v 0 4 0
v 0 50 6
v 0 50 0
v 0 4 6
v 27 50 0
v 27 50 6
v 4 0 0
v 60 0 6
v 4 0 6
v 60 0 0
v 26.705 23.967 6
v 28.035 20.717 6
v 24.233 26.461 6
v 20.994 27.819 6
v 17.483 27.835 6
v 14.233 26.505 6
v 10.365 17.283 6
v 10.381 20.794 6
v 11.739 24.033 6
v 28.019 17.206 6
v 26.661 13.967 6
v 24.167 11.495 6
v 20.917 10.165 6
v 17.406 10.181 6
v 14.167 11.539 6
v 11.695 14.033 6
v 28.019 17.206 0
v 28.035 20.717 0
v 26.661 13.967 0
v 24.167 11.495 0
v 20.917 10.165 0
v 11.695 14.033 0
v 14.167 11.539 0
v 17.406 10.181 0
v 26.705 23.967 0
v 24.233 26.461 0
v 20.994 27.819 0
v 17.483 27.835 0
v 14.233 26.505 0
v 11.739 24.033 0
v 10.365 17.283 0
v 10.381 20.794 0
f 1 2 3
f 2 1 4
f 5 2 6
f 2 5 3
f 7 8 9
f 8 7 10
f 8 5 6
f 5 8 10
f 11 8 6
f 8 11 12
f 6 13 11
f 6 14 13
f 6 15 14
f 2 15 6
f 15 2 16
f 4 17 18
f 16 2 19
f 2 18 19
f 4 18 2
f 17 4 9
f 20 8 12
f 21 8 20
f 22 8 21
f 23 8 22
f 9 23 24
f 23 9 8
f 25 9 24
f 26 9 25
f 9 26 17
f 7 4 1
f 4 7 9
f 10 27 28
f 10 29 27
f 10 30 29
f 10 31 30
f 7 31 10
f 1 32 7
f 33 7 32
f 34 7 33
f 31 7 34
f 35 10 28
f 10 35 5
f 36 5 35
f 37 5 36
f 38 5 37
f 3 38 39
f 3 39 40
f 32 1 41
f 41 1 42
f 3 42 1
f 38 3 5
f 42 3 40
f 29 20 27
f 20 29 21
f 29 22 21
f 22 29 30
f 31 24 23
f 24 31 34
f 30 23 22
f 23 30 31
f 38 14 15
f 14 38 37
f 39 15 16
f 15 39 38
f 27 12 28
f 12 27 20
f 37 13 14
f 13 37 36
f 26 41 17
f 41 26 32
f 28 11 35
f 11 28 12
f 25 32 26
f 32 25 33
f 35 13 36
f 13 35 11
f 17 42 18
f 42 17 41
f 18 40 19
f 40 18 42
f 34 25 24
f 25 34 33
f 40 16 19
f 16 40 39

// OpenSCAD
$fn = 32;

// ----------------------------------------------------------------------
// Bracket plate: gusset 60 x 50
// ----------------------------------------------------------------------

// --- parameters (mm) ---
hole_r = 4;               // bolt hole radius
plate_t = 6;              // plate thickness, Z (extrusion height)
gus_a = 60;               // base length
gus_b = 50;               // height
top_x = 27;               // top edge X of the angled cut
light_r = 9;              // lightening hole radius

light_d = 2 * light_r;

profile = [[4, 0], [30, 0], [60, 0], [27, 50], [0, 50], [0, 4]];  // primary outline, 6 points, counter clockwise
void_1 = [[28.035, 20.717], [26.705, 23.967], [24.233, 26.461], [20.994, 27.819], [17.483, 27.835], [14.233, 26.505], [11.739, 24.033], [10.381, 20.794], [10.365, 17.283], [11.695, 14.033], [14.167, 11.539], [17.406, 10.181], [20.917, 10.165], [24.167, 11.495], [26.661, 13.967], [28.019, 17.206]];  // lightening hole, 16 points

// --- the one profile operation ---
difference() {
  linear_extrude(height = plate_t) polygon(points = profile);
  translate([0, 0, -1])
    linear_extrude(height = plate_t + 2) polygon(points = void_1);
}
